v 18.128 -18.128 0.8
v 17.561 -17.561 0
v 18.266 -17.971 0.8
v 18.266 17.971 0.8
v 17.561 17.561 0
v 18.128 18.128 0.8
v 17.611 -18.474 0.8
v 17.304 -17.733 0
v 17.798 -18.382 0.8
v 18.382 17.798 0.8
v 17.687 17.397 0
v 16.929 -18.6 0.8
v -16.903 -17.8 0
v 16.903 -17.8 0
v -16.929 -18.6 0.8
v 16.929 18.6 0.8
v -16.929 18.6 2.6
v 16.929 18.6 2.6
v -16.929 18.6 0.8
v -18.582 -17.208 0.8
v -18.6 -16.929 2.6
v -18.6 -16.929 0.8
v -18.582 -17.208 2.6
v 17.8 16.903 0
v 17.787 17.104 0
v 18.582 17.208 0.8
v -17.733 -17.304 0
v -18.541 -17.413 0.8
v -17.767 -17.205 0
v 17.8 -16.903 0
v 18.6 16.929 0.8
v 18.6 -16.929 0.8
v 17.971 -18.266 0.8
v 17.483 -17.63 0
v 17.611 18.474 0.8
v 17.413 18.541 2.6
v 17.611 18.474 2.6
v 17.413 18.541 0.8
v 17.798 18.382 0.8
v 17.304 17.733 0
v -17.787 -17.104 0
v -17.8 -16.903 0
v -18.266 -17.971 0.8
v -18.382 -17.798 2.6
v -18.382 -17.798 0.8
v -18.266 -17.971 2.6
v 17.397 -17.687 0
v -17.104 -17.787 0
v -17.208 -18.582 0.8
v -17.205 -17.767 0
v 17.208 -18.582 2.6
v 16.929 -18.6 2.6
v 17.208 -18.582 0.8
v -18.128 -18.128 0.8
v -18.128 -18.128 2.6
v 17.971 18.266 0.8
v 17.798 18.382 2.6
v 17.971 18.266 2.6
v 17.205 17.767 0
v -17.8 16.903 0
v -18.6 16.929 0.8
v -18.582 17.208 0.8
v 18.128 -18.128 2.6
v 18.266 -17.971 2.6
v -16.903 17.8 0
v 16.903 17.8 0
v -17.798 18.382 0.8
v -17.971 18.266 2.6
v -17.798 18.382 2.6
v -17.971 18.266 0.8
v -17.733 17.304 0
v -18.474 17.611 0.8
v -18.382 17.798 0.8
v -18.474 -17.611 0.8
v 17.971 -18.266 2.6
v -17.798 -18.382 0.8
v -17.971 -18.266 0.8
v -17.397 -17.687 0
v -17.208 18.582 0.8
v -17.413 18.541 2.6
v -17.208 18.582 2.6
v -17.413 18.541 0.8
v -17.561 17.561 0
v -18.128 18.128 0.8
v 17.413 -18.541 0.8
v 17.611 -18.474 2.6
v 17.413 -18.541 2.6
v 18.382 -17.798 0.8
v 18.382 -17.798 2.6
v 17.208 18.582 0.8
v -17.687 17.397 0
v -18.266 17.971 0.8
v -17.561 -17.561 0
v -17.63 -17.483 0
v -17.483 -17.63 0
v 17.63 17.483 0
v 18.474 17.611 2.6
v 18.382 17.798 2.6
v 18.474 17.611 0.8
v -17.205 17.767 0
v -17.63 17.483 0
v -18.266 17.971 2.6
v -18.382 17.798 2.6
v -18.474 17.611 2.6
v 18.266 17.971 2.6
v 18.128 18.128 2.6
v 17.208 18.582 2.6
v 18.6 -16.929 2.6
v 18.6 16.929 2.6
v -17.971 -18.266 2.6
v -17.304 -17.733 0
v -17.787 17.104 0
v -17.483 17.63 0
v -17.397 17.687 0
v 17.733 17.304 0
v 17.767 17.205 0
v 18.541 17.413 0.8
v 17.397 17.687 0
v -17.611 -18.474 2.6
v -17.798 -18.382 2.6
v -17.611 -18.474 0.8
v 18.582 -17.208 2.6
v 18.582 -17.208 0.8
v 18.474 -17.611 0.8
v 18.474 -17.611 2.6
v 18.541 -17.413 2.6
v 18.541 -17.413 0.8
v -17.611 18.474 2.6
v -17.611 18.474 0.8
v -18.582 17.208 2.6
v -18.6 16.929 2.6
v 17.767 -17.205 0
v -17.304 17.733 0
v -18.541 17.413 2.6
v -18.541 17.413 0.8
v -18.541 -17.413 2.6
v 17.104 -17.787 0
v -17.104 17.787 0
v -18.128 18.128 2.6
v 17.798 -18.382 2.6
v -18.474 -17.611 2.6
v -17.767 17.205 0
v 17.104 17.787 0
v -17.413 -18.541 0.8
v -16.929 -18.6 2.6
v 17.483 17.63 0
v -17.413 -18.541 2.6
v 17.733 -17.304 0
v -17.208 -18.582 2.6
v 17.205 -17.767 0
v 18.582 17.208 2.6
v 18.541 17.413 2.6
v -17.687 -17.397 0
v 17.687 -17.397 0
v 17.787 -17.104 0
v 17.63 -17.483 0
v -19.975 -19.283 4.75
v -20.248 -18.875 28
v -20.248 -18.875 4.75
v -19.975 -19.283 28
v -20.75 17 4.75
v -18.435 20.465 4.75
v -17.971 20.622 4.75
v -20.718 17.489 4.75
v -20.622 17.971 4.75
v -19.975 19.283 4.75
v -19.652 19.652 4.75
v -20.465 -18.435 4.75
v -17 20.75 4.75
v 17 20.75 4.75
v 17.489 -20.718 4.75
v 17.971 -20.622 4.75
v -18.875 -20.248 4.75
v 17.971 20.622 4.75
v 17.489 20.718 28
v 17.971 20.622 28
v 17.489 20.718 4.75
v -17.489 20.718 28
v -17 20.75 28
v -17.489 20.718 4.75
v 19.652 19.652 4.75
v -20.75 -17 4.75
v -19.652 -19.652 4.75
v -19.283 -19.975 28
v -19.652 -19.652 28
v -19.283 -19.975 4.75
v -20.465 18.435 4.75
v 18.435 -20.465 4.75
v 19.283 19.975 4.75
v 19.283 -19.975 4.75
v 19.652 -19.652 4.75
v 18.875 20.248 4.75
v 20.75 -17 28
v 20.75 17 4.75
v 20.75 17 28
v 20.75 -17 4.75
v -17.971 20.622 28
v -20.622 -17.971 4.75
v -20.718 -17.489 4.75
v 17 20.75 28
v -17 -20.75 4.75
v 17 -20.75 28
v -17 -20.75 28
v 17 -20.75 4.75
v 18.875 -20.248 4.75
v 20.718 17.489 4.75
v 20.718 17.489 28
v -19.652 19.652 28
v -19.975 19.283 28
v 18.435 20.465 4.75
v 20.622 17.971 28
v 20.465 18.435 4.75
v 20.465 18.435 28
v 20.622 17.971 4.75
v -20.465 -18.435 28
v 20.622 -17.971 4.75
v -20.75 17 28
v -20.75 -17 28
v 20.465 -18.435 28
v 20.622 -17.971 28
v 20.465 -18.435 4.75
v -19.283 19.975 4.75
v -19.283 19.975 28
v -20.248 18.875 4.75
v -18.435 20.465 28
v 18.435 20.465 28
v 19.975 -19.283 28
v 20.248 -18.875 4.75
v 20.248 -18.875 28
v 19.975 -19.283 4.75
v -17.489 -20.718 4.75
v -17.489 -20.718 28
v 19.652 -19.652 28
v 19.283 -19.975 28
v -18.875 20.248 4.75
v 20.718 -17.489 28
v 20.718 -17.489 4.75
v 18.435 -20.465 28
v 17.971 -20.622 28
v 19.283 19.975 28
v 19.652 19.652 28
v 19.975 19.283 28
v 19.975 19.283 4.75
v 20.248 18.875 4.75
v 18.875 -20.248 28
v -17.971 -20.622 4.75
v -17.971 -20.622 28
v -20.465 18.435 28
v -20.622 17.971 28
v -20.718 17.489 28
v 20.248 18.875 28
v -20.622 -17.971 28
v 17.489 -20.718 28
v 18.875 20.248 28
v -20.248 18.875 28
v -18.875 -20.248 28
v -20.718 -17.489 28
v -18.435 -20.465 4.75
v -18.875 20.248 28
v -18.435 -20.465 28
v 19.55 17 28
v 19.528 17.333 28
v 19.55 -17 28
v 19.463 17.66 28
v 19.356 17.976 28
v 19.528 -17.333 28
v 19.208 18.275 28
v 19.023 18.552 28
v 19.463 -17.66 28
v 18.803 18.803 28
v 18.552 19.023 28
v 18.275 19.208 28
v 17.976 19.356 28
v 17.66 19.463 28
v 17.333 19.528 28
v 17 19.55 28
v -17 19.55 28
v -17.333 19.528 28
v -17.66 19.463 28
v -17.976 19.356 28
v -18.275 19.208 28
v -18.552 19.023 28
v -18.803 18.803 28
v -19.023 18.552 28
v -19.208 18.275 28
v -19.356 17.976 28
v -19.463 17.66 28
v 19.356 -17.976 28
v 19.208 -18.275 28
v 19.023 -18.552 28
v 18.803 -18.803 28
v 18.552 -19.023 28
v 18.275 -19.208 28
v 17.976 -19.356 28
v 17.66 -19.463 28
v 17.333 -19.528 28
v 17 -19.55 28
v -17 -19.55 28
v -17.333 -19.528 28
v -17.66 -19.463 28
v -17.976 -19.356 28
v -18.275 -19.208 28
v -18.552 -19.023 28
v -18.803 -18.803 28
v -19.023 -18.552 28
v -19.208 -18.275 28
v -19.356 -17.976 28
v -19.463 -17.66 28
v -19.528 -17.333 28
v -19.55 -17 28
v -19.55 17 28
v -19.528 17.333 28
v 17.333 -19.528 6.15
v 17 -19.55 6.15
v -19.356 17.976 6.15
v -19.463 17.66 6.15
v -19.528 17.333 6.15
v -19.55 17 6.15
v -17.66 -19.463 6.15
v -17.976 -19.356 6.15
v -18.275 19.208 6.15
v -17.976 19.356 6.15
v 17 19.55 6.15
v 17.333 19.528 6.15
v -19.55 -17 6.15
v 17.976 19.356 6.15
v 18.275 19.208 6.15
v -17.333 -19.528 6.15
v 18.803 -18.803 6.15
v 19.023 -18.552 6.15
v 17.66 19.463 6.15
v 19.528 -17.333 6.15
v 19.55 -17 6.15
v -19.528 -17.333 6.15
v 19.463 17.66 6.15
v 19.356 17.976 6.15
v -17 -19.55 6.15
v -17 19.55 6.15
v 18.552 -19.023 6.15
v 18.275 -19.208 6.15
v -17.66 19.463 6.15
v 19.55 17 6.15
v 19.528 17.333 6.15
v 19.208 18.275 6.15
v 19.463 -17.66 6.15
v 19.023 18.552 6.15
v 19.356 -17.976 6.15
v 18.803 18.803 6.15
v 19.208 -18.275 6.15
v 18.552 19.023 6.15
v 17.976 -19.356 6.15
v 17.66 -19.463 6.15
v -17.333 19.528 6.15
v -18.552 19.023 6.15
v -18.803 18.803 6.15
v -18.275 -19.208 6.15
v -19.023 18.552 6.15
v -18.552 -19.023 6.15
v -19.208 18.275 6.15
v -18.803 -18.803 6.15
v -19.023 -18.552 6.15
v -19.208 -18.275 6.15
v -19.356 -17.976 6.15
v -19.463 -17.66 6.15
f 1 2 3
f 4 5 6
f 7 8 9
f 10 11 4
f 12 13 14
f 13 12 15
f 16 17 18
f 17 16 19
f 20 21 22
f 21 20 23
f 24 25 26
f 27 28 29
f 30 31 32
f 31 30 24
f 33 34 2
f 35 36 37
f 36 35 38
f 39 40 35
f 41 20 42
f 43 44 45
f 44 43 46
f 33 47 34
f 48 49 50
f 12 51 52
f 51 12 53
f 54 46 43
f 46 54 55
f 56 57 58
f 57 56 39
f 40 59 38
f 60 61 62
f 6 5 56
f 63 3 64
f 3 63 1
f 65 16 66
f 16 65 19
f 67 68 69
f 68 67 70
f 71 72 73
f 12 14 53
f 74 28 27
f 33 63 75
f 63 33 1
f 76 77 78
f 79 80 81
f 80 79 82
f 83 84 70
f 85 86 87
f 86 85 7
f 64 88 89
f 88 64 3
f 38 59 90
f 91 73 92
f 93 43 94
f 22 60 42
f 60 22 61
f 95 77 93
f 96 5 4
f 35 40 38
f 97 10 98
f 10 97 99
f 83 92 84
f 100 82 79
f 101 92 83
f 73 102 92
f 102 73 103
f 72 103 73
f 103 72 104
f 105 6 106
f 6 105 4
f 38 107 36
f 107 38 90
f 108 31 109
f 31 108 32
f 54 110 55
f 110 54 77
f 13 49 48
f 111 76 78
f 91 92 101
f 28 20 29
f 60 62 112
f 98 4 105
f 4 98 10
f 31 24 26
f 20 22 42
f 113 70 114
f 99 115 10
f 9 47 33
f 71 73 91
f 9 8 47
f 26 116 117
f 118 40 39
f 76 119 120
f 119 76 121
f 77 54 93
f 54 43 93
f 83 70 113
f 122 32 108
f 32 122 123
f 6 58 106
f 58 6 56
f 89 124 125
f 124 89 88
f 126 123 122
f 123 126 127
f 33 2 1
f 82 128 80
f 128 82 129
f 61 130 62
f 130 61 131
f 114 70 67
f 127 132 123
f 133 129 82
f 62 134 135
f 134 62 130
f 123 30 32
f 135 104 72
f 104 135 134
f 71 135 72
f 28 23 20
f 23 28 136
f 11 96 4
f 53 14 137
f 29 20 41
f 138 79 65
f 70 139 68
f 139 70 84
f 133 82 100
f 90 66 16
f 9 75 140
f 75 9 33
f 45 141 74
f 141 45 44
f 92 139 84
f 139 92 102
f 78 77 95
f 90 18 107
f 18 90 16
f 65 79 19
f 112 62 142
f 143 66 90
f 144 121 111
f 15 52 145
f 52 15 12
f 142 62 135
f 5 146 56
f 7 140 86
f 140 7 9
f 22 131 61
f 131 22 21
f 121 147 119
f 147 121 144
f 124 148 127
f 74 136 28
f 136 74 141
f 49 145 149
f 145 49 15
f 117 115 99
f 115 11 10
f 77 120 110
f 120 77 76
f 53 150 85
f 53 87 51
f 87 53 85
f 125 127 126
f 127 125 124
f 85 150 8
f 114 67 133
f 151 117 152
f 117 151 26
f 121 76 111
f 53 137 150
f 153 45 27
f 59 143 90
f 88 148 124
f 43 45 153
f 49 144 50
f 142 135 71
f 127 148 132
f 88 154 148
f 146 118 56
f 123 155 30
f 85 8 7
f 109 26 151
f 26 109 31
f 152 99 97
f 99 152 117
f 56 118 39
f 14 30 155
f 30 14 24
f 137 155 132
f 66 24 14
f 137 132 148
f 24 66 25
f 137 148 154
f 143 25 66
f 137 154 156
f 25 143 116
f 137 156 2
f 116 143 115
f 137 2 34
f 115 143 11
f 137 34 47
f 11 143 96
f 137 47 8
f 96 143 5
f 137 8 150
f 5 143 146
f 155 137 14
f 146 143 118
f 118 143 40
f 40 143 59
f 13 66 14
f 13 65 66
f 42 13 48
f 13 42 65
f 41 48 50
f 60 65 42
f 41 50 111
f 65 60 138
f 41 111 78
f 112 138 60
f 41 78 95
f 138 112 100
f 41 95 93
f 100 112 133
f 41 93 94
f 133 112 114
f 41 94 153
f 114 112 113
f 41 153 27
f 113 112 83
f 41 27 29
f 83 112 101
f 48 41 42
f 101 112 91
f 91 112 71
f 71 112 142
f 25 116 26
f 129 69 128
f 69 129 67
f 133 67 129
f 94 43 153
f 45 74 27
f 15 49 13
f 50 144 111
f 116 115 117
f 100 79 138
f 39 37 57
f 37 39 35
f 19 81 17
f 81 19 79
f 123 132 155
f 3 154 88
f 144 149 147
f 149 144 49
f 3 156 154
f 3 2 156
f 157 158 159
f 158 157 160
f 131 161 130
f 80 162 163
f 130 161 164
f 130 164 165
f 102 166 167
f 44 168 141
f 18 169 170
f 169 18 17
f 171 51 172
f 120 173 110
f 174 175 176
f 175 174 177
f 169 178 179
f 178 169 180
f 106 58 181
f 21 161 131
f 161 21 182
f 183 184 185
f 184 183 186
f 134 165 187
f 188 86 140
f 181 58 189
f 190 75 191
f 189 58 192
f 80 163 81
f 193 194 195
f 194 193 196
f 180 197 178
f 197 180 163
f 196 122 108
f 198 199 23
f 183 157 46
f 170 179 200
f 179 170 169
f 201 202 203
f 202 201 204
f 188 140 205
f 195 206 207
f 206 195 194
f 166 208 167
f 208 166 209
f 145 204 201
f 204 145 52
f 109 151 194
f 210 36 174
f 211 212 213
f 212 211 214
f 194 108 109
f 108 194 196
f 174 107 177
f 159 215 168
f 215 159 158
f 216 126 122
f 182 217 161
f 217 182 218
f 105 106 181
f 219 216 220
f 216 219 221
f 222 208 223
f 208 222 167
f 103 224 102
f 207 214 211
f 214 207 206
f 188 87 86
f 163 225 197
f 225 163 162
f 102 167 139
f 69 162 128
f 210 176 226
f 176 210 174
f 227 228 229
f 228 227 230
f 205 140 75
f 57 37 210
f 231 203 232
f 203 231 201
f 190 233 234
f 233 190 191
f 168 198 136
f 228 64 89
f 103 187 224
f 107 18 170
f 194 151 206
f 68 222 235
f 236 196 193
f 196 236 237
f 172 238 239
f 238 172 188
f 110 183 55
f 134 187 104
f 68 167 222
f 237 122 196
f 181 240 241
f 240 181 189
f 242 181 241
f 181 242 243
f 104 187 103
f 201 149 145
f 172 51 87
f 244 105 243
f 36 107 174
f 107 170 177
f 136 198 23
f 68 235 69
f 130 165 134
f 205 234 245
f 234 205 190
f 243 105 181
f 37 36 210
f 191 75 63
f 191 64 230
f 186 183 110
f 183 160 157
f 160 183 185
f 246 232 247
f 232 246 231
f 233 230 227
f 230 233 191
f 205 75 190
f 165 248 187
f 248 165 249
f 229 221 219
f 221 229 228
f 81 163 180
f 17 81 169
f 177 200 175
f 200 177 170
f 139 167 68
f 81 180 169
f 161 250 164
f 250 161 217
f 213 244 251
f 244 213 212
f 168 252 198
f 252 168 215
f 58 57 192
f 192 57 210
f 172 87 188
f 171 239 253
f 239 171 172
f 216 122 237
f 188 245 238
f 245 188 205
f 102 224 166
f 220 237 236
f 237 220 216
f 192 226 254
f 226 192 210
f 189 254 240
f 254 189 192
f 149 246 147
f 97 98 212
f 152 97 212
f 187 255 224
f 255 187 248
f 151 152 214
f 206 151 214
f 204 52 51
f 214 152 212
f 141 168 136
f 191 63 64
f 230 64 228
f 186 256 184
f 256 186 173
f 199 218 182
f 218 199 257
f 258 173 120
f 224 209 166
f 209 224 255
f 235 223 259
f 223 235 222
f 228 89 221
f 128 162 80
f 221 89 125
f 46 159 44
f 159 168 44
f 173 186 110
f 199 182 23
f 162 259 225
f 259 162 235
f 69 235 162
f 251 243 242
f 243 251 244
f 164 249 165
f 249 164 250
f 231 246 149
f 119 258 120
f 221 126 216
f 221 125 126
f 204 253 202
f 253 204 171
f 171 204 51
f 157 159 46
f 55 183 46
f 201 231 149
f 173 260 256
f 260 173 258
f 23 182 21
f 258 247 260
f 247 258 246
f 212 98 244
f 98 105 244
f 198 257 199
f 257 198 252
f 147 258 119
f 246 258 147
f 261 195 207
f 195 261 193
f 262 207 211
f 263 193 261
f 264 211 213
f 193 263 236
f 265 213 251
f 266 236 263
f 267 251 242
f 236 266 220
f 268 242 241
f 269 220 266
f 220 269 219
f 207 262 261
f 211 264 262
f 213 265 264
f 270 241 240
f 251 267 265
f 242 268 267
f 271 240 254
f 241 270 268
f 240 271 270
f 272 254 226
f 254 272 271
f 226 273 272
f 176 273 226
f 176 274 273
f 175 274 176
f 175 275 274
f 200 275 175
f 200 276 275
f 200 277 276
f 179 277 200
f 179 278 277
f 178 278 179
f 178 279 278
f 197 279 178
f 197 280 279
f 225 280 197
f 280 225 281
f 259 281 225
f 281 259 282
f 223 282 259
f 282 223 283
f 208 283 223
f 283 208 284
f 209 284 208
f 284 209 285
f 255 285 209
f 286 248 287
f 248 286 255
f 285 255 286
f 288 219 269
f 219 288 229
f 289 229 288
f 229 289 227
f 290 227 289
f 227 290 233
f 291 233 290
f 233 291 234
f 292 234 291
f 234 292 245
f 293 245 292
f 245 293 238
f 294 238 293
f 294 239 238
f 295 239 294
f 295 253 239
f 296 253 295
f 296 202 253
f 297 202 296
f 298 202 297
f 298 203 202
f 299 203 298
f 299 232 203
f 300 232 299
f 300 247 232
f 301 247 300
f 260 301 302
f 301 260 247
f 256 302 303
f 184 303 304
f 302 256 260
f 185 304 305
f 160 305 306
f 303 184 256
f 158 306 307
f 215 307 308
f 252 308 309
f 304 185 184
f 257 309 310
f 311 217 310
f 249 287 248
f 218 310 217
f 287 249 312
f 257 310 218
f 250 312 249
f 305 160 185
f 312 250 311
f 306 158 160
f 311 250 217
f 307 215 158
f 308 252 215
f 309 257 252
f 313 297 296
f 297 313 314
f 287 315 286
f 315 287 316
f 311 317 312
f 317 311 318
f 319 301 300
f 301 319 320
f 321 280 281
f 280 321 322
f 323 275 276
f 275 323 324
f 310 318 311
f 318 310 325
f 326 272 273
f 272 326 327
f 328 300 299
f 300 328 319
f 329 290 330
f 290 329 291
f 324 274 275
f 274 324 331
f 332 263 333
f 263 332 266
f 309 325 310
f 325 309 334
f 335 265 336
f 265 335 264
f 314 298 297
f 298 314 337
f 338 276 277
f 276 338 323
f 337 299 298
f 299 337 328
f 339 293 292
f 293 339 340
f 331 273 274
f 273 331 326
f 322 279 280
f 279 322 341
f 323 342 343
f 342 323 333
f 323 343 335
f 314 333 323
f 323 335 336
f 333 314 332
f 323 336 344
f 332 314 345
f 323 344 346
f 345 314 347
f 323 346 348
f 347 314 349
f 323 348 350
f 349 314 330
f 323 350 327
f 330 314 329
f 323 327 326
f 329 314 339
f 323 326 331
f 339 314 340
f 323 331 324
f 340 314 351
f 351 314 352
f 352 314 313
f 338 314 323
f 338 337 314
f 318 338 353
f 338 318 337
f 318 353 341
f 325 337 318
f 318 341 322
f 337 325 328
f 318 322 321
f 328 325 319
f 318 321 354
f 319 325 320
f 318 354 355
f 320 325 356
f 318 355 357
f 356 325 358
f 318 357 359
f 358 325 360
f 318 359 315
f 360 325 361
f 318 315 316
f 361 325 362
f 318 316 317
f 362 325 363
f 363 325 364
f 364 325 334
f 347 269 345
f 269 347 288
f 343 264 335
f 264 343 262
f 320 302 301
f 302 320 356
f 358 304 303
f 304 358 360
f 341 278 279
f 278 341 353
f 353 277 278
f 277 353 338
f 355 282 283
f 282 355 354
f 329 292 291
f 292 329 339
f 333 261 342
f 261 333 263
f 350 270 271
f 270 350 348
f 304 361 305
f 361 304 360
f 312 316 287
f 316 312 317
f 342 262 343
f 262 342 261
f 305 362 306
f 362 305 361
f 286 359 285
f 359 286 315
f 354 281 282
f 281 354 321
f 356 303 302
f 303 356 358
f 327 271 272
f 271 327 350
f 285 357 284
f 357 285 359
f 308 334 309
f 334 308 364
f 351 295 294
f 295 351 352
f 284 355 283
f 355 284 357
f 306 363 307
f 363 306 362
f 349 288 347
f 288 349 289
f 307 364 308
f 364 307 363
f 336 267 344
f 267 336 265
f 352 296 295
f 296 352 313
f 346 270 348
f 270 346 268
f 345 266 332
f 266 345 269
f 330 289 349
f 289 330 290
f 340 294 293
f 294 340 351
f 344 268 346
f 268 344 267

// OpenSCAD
// file: lib/gridfinity.scad
// gridfinity.scad — shared Gridfinity baseplate + bin library (per spec).
//
// SPDX-License-Identifier: MIT
// Copyright (c) 2026 Aaron Cupp
//
// Original work, written from the published Gridfinity dimensional spec — no
// code derives from any other Gridfinity implementation. Previously published
// under CC BY-NC 4.0 in IamMrCupp/3d-printer-models; relicensed MIT here by the
// copyright holder.
//
// 42 mm pitch, 41.5 mm bins, baseplate socket 0.7/1.8/2.15 = 4.65 mm, 4 mm
// fillet; bin foot 0.8/1.8/2.15 = 4.75 mm, 3.75 mm corner radius. Verified the
// bin foot seats in the baseplate socket with ~0.25–0.5 mm clearance.
//
//   baseplate(nx, ny)                      — tiled receiving baseplate
//   bin(nx, ny, h, wall, floor)            — open Gridfinity bin
//   divided_bin(nx, ny, h, cols, rows, …)  — bin with internal compartments

GF = 42; GF_FILLET = 4;
_C_TOP = 2.15; _C_MID = 1.8; _C_BOT = 0.7;
_BP_LIP = _C_TOP + _C_MID + _C_BOT; _BP_FLOOR = 1.2; BP_H = _BP_LIP + _BP_FLOOR;  // 5.85
BIN_SZ = 41.5; BIN_R = 3.75; BIN_BASE_H = 4.75;

// ---- baseplate ----
module _bp_cell(i = 0) { offset(r = -i) offset(r = GF_FILLET) offset(r = -GF_FILLET) square(GF, center = true); }
module _bp_socket() {
    e = 0.01;
    hull() { translate([0,0,BP_H-e]) linear_extrude(e) _bp_cell(0); translate([0,0,BP_H-_C_TOP]) linear_extrude(e) _bp_cell(_C_TOP); }
    translate([0,0,BP_H-_C_TOP-_C_MID]) linear_extrude(_C_MID) _bp_cell(_C_TOP);
    hull() { translate([0,0,BP_H-_C_TOP-_C_MID-e]) linear_extrude(e) _bp_cell(_C_TOP); translate([0,0,BP_H-_BP_LIP]) linear_extrude(e) _bp_cell(_C_TOP+_C_BOT); }
}
module baseplate(nx, ny) {
    w = nx*GF; d = ny*GF;
    difference() {
        translate([0,0,BP_H/2]) linear_extrude(BP_H, center=true) offset(GF_FILLET) offset(-GF_FILLET) square([w,d], center=true);
        for (ix=[0:nx-1], iy=[0:ny-1]) translate([(ix-(nx-1)/2)*GF, (iy-(ny-1)/2)*GF, 0]) _bp_socket();
    }
}

// ---- bin ----
module _bin_cell(i = 0) { offset(r = -i) offset(r = BIN_R) offset(r = -BIN_R) square(BIN_SZ, center = true); }
module _bin_foot() {
    e = 0.01;
    hull() { linear_extrude(e) _bin_cell(2.95); translate([0,0,0.8]) linear_extrude(e) _bin_cell(2.15); }    // bottom chamfer
    translate([0,0,0.8]) linear_extrude(1.8) _bin_cell(2.15);                                                 // vertical
    hull() { translate([0,0,2.6]) linear_extrude(e) _bin_cell(2.15); translate([0,0,BIN_BASE_H]) linear_extrude(e) _bin_cell(0); } // top chamfer
}
module _bin_shell(nx, ny, h, wall, floor) {
    W = nx*GF - 0.5; D = ny*GF - 0.5;
    difference() {
        union() {
            for (ix=[0:nx-1], iy=[0:ny-1]) translate([(ix-(nx-1)/2)*GF, (iy-(ny-1)/2)*GF, 0]) _bin_foot();
            translate([0,0,BIN_BASE_H]) linear_extrude(h-BIN_BASE_H) offset(BIN_R) offset(-BIN_R) square([W,D], center=true);
        }
        translate([0,0,BIN_BASE_H+floor]) linear_extrude(h) offset(BIN_R-wall) offset(-(BIN_R-wall)) square([W-2*wall, D-2*wall], center=true);
    }
}
module bin(nx, ny, h, wall = 1.2, floor = 1.4) { _bin_shell(nx, ny, h, wall, floor); }

module divided_bin(nx, ny, h, cols = 1, rows = 1, wall = 1.2, floor = 1.4, div = 1.2) {
    W = nx*GF - 0.5; D = ny*GF - 0.5;
    union() {
        bin(nx, ny, h, wall, floor);
        // internal divider walls (from the floor up to the rim)
        iw = W - 2*wall; id = D - 2*wall; z0 = BIN_BASE_H + floor;
        for (c = [1 : cols-1]) translate([-iw/2 + c*iw/cols - div/2, -id/2, z0]) cube([div, id, h - z0]);
        for (r = [1 : rows-1]) translate([-iw/2, -id/2 + r*id/rows - div/2, z0]) cube([iw, div, h - z0]);
    }
}
// main file
// test_bin.scad — a standard 1×1 Gridfinity bin to click-test the baseplate.
//
// SPDX-License-Identifier: MIT
// Copyright (c) 2026 Aaron Cupp
//
// The fixed reference object for tuning. It's a plain spec-correct Gridfinity
// bin — nothing Clickfinity-specific — so it never changes as the arm
// parameters are tuned. Print it ONCE in PETG and keep it on the bench; every
// 1x1_test.scad iteration clicks into this same bin.
//
// If you already own any standard 42 mm Gridfinity bin, you don't need this —
// the latch grabs the standard foot, not this particular print.

use <lib/gridfinity.scad>

/* [Bin] */
BIN_H = 28;   // [14:7:63] total height, mm. ~3–4 U — tall enough to grip and pull.

/* [Quality] */
$fn = 48;     // [24:8:96]

bin(1, 1, BIN_H);
